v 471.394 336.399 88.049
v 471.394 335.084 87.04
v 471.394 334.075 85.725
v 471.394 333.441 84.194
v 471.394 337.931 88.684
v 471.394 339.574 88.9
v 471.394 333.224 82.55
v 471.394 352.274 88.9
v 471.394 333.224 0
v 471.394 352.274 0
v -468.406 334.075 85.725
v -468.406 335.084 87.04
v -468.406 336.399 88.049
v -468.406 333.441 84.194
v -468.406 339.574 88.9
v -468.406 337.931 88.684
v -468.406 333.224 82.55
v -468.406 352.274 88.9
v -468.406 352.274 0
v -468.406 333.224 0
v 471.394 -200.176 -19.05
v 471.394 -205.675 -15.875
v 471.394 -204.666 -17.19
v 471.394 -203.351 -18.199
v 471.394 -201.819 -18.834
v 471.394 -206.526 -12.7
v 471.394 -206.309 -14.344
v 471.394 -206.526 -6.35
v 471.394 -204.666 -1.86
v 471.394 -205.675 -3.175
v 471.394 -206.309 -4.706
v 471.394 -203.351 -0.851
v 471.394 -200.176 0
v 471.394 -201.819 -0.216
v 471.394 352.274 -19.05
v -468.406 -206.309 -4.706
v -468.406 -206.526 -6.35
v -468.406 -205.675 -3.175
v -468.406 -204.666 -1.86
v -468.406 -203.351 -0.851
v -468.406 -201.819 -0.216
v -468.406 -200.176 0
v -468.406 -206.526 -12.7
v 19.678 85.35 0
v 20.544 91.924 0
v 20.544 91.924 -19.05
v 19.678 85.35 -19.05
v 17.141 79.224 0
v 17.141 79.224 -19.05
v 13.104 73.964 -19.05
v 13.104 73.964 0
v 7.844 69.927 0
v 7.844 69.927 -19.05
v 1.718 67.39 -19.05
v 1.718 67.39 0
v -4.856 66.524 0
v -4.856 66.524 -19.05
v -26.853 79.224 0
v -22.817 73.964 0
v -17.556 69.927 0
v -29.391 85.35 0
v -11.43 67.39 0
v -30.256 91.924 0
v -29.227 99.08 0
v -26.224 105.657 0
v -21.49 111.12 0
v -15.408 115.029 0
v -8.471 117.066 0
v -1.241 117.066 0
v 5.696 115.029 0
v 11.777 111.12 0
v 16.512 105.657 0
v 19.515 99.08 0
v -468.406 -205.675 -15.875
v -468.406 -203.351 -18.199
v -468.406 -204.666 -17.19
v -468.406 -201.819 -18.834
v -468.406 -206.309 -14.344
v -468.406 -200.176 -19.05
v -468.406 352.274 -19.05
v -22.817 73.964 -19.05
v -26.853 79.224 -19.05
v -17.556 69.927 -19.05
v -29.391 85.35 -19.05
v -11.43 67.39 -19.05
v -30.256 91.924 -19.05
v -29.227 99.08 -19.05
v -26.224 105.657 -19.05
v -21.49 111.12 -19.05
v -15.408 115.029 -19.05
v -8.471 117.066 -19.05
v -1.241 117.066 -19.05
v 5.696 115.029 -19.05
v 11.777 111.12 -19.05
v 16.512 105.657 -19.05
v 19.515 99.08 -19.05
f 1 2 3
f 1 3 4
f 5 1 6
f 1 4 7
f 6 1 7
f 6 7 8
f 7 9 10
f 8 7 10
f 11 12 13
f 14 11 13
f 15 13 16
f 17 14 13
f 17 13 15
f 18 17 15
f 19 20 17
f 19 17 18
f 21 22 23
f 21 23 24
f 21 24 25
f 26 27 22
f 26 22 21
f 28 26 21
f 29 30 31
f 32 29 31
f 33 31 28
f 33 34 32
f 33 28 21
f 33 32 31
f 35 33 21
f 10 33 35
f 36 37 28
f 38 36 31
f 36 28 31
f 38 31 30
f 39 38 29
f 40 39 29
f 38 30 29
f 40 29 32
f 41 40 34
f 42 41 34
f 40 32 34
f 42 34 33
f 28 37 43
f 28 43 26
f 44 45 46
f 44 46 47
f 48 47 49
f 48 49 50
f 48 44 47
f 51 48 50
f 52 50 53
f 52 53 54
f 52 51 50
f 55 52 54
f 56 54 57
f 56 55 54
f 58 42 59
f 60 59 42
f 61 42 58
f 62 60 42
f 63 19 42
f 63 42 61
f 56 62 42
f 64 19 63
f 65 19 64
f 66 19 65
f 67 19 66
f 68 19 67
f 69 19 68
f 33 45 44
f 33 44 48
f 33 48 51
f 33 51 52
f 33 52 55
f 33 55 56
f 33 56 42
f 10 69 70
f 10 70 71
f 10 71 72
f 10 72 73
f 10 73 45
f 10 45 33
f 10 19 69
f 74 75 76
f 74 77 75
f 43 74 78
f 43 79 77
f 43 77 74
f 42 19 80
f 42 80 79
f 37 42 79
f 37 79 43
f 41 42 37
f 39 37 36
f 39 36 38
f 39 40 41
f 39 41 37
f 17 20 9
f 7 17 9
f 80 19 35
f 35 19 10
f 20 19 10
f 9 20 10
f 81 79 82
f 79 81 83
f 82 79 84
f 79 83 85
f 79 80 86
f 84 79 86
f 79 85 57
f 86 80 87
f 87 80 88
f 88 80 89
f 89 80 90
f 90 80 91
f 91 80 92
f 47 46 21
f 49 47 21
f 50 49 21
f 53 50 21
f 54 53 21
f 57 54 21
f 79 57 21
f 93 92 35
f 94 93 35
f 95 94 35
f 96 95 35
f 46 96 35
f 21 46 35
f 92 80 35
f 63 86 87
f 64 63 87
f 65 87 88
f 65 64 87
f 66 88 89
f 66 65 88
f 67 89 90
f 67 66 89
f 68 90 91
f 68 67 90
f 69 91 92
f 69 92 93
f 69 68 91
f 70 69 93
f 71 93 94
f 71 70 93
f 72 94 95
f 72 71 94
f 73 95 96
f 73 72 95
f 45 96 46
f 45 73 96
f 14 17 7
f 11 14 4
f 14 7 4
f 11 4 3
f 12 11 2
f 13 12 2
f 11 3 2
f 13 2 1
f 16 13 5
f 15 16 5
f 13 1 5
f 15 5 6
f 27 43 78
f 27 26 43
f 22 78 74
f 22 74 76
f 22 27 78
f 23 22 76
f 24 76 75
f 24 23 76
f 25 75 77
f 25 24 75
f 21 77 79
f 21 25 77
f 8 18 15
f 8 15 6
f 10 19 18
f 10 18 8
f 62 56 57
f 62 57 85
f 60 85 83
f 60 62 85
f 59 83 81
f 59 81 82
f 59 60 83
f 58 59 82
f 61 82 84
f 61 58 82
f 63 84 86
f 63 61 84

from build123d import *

# Parameters (mm, degrees)
F0_W     = 939.8
F0_H     = 19.05
F1_DEPTH = 88.9
F2_DEPTH = 19.05
F3_R     = 6.35
F3_2_R   = 6.35


with BuildPart() as f1:
    # F0 (on Top) → F1 (new body)
    with BuildSketch(Plane.XY):
        with Locations((1.493961, 342.749269)):
            Rectangle(F0_W, F0_H)
    extrude(amount=F1_DEPTH)

    # F3
    f3_edges = [f1.edges().sort_by_distance(p)[0] for p in [
        (1.493961, 333.224269, 88.9),
    ]]
    fillet(f3_edges, radius=F3_R)


with BuildPart() as f2:
    # F0 (on Top) → F2 (new body)
    with BuildSketch(Plane.XY):
        with Locations((1.493961, 342.749269)):
            Rectangle(F0_W, F0_H)
        with BuildLine():
            Line((471.393961, 333.224269), (-468.406039, 333.224269))
            Line((-468.406039, 333.224269), (-468.406039, 91.924269))
            Line((-468.406039, 91.924269), (-30.256039, 91.924269))
            ThreePointArc((-30.256039, 91.924269), (-4.856039, 117.324269), (20.543961, 91.924269))
            ThreePointArc((20.543961, 91.924269), (13.104473, 73.963757), (-4.856039, 66.524269))
            Line((-4.856039, 66.524269), (-4.856039, -206.525731))
            Line((-4.856039, -206.525731), (471.393961, -206.525731))
            Line((471.393961, -206.525731), (471.393961, 333.224269))
        make_face()
        with BuildLine():
            Line((-30.256039, 91.924269), (-468.406039, 91.924269))
            Line((-468.406039, 91.924269), (-468.406039, -206.525731))
            Line((-468.406039, -206.525731), (-4.856039, -206.525731))
            Line((-4.856039, -206.525731), (-4.856039, 66.524269))
            ThreePointArc((-4.856039, 66.524269), (-22.816552, 73.963757), (-30.256039, 91.924269))
        make_face()
    extrude(amount=-F2_DEPTH)

    # F3#2
    f3_2_edges = [f2.edges().sort_by_distance(p)[0] for p in [
        (1.493961, -206.525731, 0),
        (1.493961, -206.525731, -19.05),
    ]]
    fillet(f3_2_edges, radius=F3_2_R)


solid = Compound([f1.part, f2.part])
